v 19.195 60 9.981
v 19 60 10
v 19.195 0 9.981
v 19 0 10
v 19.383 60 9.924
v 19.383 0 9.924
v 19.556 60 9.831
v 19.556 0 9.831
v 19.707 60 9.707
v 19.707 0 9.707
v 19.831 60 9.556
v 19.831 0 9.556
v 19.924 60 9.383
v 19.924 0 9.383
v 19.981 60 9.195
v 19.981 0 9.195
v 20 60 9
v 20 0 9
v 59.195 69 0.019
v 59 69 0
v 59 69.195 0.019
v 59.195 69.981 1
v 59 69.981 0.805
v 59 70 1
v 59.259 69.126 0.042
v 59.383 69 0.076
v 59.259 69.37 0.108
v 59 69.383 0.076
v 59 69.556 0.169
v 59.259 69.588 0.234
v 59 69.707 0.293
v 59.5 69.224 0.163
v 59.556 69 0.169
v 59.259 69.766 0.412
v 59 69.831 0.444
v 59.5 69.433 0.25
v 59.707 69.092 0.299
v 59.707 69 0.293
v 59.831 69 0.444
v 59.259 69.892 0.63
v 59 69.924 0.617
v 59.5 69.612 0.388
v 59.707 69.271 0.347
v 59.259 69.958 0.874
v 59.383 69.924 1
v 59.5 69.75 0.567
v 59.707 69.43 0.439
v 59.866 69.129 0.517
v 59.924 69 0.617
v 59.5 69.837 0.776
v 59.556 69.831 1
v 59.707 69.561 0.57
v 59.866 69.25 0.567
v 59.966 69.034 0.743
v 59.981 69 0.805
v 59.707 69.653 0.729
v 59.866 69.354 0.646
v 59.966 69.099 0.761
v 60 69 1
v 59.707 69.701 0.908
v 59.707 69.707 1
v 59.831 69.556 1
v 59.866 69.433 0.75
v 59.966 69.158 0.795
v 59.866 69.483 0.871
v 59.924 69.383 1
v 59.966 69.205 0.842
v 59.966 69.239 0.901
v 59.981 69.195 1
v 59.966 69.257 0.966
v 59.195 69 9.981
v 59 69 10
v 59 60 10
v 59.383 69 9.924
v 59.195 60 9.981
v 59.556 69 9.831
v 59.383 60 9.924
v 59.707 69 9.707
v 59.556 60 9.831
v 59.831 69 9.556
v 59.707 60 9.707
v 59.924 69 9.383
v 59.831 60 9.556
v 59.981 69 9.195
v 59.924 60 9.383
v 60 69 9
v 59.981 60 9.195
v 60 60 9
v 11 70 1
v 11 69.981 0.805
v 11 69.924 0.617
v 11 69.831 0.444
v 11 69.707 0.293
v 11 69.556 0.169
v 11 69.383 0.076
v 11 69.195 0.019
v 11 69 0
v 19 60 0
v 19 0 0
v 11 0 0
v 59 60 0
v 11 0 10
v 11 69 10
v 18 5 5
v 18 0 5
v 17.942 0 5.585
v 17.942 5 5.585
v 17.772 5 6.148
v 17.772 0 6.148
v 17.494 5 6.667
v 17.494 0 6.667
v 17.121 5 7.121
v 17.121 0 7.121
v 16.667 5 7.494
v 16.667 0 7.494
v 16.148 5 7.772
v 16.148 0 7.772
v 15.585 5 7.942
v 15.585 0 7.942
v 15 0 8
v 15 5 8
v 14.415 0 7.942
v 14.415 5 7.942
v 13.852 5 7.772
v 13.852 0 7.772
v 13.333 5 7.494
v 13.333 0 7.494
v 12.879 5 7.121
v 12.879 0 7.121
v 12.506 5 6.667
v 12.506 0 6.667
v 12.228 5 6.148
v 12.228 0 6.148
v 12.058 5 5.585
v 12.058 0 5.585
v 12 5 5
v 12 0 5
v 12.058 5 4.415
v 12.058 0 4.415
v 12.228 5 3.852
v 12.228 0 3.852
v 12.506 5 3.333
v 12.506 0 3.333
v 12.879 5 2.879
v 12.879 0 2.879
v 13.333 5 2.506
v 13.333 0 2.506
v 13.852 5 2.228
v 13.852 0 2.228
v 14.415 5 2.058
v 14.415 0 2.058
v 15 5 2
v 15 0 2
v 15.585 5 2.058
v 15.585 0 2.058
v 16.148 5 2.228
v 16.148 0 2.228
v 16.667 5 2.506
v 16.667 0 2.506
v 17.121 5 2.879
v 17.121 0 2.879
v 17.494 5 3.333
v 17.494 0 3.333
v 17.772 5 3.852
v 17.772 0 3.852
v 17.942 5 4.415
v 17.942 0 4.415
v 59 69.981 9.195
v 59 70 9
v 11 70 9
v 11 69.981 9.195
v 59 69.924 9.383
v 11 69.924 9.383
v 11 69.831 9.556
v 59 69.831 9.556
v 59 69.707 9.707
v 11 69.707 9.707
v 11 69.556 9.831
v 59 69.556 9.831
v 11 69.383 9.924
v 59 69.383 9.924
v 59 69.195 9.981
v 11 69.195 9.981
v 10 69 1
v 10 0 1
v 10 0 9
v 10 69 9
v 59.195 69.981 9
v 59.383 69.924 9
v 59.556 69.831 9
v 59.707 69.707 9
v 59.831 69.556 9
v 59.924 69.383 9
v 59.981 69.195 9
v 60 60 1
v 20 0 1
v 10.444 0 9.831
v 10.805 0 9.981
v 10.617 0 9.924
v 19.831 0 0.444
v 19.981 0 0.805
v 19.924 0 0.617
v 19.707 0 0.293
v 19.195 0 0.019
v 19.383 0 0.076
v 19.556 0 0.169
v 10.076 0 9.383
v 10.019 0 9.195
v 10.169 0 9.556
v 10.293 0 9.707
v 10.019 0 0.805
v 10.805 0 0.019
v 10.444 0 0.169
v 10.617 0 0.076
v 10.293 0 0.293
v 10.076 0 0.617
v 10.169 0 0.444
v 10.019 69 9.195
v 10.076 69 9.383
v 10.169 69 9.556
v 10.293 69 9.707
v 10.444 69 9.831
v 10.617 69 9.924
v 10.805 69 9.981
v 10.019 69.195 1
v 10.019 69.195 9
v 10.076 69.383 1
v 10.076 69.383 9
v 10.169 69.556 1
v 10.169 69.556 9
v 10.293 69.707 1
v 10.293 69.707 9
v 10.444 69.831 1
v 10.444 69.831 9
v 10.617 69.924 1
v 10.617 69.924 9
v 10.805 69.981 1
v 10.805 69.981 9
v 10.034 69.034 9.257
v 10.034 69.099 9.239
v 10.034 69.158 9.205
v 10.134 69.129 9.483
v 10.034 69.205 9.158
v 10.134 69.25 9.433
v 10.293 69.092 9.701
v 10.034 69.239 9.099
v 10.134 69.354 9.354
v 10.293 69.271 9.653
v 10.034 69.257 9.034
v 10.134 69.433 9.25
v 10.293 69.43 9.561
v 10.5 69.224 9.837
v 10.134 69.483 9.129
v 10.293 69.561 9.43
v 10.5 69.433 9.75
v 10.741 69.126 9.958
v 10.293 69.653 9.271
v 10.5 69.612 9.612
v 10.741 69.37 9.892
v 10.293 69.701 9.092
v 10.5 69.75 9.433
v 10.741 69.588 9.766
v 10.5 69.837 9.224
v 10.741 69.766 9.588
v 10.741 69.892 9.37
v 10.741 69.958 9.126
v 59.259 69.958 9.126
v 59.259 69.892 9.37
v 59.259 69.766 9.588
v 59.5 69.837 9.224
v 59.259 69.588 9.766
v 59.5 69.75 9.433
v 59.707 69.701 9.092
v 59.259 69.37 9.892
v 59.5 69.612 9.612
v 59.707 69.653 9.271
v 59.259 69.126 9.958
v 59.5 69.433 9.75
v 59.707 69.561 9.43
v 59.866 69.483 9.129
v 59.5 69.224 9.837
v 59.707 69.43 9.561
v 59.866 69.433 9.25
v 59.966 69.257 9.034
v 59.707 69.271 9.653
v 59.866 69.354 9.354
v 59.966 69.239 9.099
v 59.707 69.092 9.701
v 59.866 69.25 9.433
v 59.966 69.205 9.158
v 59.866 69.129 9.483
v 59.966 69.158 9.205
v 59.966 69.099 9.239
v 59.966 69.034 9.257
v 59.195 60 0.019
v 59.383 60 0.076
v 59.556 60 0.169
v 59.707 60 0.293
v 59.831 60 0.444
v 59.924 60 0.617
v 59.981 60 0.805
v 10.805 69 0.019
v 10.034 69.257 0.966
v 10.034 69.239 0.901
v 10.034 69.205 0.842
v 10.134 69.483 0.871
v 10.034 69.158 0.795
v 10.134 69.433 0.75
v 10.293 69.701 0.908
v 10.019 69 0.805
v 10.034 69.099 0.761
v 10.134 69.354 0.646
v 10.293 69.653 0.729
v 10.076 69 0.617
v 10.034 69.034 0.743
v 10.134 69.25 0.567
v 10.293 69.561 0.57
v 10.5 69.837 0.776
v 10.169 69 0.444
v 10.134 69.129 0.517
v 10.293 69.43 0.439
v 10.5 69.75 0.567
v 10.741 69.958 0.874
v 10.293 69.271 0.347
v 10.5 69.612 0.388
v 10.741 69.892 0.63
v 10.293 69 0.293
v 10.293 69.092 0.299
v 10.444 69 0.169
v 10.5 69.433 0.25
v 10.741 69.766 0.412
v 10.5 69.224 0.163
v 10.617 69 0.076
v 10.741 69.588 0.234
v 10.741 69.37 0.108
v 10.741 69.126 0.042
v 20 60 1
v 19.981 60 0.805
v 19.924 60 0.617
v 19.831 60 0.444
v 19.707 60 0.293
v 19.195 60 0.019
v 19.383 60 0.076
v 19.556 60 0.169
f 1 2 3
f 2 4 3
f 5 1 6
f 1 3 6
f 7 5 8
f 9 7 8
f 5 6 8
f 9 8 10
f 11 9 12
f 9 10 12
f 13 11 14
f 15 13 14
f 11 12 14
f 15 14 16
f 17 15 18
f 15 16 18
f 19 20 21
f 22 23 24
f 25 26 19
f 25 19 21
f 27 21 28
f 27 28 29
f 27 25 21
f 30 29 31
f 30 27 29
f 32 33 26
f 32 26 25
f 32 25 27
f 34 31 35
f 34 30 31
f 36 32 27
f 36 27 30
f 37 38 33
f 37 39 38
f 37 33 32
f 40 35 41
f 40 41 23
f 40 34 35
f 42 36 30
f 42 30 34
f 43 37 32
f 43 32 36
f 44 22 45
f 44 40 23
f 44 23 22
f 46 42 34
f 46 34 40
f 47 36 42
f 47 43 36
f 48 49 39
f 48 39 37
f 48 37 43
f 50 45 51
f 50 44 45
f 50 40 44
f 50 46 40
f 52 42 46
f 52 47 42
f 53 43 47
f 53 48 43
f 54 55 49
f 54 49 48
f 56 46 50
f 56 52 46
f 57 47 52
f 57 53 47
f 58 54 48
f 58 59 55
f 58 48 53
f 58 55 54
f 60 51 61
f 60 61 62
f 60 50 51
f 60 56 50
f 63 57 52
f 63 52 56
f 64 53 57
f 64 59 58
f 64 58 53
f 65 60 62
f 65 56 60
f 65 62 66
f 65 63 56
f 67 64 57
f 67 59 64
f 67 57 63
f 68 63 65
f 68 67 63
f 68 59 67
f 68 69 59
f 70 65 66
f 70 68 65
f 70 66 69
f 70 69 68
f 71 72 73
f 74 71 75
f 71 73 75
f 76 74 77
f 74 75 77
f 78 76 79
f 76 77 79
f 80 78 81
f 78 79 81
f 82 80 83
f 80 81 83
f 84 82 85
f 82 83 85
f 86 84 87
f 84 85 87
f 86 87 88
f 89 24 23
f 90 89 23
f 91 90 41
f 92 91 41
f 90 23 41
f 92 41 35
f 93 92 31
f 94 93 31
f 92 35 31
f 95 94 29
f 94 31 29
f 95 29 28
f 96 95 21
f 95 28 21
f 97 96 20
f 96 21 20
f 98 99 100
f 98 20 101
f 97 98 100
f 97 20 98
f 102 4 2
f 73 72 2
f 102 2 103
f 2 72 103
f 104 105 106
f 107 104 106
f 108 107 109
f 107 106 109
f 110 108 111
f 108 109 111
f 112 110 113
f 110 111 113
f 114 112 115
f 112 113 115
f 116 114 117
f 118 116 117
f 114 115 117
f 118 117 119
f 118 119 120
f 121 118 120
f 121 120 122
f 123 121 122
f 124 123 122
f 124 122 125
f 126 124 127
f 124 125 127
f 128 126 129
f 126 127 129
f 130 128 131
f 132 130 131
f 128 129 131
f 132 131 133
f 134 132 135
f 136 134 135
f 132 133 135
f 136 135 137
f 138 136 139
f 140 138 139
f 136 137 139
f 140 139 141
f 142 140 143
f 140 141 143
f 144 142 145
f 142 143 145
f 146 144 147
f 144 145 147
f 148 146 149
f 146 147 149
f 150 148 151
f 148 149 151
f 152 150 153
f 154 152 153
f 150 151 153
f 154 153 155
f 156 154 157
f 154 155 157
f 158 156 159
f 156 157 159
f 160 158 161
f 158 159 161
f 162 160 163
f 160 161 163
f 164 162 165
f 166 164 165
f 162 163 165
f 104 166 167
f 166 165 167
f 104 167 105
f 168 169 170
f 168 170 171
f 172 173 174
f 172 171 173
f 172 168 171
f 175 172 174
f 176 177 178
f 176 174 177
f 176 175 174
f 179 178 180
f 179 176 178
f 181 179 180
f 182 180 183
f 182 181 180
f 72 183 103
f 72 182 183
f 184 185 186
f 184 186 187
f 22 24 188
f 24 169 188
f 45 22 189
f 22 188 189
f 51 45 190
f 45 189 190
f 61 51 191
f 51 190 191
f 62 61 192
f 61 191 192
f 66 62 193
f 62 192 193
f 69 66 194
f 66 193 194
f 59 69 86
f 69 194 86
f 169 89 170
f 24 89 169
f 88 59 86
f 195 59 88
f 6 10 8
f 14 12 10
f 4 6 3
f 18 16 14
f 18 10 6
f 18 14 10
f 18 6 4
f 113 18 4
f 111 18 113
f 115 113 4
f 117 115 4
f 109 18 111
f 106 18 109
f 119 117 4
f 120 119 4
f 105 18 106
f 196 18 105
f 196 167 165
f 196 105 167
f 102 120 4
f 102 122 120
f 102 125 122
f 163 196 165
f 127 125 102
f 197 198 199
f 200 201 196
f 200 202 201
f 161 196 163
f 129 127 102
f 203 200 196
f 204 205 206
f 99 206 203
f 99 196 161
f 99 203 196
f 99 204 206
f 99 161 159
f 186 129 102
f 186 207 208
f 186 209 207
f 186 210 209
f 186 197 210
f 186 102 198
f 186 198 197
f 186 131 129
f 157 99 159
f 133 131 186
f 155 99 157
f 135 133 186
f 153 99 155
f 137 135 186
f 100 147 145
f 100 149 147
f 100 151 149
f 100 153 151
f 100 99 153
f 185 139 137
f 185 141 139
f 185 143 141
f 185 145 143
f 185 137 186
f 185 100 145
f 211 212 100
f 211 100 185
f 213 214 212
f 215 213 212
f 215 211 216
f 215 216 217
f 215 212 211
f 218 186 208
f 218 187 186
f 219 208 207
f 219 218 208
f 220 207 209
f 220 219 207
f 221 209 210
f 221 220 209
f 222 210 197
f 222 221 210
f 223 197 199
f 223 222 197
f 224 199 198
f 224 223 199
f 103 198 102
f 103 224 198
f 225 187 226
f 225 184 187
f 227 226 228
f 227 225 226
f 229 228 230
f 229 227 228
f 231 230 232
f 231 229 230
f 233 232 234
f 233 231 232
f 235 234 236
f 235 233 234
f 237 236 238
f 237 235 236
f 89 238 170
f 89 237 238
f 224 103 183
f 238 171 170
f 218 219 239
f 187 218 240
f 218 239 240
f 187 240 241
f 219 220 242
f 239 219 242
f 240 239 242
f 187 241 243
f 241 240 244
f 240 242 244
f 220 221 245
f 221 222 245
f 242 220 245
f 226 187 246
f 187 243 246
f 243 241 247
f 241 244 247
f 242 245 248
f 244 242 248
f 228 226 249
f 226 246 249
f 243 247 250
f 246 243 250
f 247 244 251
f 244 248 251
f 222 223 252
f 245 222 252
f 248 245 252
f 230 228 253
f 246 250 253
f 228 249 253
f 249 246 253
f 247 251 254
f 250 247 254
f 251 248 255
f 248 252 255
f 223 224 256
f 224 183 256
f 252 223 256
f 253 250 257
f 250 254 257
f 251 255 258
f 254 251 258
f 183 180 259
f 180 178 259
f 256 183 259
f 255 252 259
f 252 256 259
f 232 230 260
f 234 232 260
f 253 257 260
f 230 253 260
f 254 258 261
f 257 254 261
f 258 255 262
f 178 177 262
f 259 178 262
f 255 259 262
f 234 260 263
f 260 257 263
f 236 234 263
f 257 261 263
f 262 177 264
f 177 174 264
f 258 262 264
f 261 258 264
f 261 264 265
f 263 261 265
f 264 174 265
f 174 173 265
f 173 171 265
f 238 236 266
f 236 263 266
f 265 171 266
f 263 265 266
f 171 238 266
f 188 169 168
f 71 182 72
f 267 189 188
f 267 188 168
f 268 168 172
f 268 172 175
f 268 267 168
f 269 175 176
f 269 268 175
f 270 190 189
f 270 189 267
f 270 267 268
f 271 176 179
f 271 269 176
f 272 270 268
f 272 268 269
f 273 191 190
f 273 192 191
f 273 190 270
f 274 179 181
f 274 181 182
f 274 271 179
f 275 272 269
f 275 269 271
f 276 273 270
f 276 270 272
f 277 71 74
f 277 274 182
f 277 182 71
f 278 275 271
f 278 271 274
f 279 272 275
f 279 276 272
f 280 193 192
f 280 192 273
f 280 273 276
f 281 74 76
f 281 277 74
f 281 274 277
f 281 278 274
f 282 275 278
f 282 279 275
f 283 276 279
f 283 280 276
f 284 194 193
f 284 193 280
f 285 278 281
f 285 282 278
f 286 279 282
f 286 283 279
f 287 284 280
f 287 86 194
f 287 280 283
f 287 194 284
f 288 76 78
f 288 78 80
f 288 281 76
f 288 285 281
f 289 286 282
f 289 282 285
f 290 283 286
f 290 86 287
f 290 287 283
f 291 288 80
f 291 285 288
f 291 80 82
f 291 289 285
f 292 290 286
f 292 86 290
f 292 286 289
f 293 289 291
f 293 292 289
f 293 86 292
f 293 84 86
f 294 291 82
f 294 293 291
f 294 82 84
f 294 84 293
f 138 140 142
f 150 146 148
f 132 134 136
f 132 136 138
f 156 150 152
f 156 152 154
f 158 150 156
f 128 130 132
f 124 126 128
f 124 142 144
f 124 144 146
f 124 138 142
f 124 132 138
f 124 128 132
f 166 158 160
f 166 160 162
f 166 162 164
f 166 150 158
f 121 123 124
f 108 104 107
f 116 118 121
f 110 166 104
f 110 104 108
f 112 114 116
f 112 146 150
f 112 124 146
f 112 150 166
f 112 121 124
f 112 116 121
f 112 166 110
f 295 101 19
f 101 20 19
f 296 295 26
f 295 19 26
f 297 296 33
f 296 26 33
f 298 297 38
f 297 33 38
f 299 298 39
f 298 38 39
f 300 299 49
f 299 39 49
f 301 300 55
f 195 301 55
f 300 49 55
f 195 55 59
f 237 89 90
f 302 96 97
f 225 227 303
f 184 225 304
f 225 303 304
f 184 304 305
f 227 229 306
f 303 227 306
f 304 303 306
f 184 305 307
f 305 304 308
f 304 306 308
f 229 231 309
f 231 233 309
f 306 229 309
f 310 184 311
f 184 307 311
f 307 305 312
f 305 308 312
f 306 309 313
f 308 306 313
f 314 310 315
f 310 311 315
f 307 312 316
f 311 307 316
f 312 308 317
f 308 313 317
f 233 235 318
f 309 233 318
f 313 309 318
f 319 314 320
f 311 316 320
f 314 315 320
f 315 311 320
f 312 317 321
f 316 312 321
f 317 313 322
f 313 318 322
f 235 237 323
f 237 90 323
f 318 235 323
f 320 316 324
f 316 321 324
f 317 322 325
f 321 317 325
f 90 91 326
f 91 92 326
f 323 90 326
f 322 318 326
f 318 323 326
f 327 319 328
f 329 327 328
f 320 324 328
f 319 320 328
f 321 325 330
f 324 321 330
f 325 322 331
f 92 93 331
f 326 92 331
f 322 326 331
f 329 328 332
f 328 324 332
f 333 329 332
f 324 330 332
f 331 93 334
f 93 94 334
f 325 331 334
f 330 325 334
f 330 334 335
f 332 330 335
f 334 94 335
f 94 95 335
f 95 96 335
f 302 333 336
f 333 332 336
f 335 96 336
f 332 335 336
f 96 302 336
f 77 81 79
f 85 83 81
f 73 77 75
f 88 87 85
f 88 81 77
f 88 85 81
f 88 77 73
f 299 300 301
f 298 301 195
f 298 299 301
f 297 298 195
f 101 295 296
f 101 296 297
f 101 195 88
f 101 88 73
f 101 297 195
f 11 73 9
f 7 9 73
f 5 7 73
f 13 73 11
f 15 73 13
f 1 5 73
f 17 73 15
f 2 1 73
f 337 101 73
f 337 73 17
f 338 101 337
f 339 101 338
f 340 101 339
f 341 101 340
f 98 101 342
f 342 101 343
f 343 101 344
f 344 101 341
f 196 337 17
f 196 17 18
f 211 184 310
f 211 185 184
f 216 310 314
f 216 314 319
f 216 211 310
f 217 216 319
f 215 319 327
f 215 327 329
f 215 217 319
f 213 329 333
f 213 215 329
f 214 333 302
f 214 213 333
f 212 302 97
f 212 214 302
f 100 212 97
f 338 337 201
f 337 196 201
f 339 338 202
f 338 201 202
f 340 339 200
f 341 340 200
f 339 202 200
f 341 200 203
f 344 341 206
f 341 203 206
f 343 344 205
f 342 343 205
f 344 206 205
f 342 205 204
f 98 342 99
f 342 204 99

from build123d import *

# Parameters (mm, degrees)
PAD_DEPTH    = 10
FILLET_R     = 1
FILLET001_R  = 1
FILLET002_R  = 1
FILLET003_R  = 1
FILLET004_R  = 1
FILLET005_R  = 1
SKETCH001_R  = 3
POCKET_DEPTH = 5


with BuildPart() as part:
    # Sketch → Pad (new body)
    with BuildSketch(Plane.XY):
        Polygon((10, 0), (10, 70), (60, 70), (60, 60), (20, 60), (20, 0), align=None)
    extrude(amount=PAD_DEPTH)

    # Fillet
    fillet_edges = [part.edges().sort_by_distance(p)[0] for p in [
        (35, 70, 10),
    ]]
    fillet(fillet_edges, radius=FILLET_R)

    # Fillet001
    fillet001_edges = [part.edges().sort_by_distance(p)[0] for p in [
        (35, 70, 0),
    ]]
    fillet(fillet001_edges, radius=FILLET001_R)

    # Fillet002
    fillet002_edges = [part.edges().sort_by_distance(p)[0] for p in [
        (60, 70, 5),
    ]]
    fillet(fillet002_edges, radius=FILLET002_R)

    # Fillet003
    fillet003_edges = [part.edges().sort_by_distance(p)[0] for p in [
        (20, 30, 10),
    ]]
    fillet(fillet003_edges, radius=FILLET003_R)

    # Fillet004
    fillet004_edges = [part.edges().sort_by_distance(p)[0] for p in [
        (20, 30, 0),
    ]]
    fillet(fillet004_edges, radius=FILLET004_R)

    # Fillet005
    fillet005_edges = [part.edges().sort_by_distance(p)[0] for p in [
        (10, 34.5, 10),
    ]]
    fillet(fillet005_edges, radius=FILLET005_R)

    # Sketch001 (on Face1 of Fillet005) → Pocket (cut)
    with BuildSketch(Plane.XZ):
        with Locations((15, 5)):
            Circle(SKETCH001_R)
    extrude(amount=-POCKET_DEPTH, mode=Mode.SUBTRACT)


solid = part.part
